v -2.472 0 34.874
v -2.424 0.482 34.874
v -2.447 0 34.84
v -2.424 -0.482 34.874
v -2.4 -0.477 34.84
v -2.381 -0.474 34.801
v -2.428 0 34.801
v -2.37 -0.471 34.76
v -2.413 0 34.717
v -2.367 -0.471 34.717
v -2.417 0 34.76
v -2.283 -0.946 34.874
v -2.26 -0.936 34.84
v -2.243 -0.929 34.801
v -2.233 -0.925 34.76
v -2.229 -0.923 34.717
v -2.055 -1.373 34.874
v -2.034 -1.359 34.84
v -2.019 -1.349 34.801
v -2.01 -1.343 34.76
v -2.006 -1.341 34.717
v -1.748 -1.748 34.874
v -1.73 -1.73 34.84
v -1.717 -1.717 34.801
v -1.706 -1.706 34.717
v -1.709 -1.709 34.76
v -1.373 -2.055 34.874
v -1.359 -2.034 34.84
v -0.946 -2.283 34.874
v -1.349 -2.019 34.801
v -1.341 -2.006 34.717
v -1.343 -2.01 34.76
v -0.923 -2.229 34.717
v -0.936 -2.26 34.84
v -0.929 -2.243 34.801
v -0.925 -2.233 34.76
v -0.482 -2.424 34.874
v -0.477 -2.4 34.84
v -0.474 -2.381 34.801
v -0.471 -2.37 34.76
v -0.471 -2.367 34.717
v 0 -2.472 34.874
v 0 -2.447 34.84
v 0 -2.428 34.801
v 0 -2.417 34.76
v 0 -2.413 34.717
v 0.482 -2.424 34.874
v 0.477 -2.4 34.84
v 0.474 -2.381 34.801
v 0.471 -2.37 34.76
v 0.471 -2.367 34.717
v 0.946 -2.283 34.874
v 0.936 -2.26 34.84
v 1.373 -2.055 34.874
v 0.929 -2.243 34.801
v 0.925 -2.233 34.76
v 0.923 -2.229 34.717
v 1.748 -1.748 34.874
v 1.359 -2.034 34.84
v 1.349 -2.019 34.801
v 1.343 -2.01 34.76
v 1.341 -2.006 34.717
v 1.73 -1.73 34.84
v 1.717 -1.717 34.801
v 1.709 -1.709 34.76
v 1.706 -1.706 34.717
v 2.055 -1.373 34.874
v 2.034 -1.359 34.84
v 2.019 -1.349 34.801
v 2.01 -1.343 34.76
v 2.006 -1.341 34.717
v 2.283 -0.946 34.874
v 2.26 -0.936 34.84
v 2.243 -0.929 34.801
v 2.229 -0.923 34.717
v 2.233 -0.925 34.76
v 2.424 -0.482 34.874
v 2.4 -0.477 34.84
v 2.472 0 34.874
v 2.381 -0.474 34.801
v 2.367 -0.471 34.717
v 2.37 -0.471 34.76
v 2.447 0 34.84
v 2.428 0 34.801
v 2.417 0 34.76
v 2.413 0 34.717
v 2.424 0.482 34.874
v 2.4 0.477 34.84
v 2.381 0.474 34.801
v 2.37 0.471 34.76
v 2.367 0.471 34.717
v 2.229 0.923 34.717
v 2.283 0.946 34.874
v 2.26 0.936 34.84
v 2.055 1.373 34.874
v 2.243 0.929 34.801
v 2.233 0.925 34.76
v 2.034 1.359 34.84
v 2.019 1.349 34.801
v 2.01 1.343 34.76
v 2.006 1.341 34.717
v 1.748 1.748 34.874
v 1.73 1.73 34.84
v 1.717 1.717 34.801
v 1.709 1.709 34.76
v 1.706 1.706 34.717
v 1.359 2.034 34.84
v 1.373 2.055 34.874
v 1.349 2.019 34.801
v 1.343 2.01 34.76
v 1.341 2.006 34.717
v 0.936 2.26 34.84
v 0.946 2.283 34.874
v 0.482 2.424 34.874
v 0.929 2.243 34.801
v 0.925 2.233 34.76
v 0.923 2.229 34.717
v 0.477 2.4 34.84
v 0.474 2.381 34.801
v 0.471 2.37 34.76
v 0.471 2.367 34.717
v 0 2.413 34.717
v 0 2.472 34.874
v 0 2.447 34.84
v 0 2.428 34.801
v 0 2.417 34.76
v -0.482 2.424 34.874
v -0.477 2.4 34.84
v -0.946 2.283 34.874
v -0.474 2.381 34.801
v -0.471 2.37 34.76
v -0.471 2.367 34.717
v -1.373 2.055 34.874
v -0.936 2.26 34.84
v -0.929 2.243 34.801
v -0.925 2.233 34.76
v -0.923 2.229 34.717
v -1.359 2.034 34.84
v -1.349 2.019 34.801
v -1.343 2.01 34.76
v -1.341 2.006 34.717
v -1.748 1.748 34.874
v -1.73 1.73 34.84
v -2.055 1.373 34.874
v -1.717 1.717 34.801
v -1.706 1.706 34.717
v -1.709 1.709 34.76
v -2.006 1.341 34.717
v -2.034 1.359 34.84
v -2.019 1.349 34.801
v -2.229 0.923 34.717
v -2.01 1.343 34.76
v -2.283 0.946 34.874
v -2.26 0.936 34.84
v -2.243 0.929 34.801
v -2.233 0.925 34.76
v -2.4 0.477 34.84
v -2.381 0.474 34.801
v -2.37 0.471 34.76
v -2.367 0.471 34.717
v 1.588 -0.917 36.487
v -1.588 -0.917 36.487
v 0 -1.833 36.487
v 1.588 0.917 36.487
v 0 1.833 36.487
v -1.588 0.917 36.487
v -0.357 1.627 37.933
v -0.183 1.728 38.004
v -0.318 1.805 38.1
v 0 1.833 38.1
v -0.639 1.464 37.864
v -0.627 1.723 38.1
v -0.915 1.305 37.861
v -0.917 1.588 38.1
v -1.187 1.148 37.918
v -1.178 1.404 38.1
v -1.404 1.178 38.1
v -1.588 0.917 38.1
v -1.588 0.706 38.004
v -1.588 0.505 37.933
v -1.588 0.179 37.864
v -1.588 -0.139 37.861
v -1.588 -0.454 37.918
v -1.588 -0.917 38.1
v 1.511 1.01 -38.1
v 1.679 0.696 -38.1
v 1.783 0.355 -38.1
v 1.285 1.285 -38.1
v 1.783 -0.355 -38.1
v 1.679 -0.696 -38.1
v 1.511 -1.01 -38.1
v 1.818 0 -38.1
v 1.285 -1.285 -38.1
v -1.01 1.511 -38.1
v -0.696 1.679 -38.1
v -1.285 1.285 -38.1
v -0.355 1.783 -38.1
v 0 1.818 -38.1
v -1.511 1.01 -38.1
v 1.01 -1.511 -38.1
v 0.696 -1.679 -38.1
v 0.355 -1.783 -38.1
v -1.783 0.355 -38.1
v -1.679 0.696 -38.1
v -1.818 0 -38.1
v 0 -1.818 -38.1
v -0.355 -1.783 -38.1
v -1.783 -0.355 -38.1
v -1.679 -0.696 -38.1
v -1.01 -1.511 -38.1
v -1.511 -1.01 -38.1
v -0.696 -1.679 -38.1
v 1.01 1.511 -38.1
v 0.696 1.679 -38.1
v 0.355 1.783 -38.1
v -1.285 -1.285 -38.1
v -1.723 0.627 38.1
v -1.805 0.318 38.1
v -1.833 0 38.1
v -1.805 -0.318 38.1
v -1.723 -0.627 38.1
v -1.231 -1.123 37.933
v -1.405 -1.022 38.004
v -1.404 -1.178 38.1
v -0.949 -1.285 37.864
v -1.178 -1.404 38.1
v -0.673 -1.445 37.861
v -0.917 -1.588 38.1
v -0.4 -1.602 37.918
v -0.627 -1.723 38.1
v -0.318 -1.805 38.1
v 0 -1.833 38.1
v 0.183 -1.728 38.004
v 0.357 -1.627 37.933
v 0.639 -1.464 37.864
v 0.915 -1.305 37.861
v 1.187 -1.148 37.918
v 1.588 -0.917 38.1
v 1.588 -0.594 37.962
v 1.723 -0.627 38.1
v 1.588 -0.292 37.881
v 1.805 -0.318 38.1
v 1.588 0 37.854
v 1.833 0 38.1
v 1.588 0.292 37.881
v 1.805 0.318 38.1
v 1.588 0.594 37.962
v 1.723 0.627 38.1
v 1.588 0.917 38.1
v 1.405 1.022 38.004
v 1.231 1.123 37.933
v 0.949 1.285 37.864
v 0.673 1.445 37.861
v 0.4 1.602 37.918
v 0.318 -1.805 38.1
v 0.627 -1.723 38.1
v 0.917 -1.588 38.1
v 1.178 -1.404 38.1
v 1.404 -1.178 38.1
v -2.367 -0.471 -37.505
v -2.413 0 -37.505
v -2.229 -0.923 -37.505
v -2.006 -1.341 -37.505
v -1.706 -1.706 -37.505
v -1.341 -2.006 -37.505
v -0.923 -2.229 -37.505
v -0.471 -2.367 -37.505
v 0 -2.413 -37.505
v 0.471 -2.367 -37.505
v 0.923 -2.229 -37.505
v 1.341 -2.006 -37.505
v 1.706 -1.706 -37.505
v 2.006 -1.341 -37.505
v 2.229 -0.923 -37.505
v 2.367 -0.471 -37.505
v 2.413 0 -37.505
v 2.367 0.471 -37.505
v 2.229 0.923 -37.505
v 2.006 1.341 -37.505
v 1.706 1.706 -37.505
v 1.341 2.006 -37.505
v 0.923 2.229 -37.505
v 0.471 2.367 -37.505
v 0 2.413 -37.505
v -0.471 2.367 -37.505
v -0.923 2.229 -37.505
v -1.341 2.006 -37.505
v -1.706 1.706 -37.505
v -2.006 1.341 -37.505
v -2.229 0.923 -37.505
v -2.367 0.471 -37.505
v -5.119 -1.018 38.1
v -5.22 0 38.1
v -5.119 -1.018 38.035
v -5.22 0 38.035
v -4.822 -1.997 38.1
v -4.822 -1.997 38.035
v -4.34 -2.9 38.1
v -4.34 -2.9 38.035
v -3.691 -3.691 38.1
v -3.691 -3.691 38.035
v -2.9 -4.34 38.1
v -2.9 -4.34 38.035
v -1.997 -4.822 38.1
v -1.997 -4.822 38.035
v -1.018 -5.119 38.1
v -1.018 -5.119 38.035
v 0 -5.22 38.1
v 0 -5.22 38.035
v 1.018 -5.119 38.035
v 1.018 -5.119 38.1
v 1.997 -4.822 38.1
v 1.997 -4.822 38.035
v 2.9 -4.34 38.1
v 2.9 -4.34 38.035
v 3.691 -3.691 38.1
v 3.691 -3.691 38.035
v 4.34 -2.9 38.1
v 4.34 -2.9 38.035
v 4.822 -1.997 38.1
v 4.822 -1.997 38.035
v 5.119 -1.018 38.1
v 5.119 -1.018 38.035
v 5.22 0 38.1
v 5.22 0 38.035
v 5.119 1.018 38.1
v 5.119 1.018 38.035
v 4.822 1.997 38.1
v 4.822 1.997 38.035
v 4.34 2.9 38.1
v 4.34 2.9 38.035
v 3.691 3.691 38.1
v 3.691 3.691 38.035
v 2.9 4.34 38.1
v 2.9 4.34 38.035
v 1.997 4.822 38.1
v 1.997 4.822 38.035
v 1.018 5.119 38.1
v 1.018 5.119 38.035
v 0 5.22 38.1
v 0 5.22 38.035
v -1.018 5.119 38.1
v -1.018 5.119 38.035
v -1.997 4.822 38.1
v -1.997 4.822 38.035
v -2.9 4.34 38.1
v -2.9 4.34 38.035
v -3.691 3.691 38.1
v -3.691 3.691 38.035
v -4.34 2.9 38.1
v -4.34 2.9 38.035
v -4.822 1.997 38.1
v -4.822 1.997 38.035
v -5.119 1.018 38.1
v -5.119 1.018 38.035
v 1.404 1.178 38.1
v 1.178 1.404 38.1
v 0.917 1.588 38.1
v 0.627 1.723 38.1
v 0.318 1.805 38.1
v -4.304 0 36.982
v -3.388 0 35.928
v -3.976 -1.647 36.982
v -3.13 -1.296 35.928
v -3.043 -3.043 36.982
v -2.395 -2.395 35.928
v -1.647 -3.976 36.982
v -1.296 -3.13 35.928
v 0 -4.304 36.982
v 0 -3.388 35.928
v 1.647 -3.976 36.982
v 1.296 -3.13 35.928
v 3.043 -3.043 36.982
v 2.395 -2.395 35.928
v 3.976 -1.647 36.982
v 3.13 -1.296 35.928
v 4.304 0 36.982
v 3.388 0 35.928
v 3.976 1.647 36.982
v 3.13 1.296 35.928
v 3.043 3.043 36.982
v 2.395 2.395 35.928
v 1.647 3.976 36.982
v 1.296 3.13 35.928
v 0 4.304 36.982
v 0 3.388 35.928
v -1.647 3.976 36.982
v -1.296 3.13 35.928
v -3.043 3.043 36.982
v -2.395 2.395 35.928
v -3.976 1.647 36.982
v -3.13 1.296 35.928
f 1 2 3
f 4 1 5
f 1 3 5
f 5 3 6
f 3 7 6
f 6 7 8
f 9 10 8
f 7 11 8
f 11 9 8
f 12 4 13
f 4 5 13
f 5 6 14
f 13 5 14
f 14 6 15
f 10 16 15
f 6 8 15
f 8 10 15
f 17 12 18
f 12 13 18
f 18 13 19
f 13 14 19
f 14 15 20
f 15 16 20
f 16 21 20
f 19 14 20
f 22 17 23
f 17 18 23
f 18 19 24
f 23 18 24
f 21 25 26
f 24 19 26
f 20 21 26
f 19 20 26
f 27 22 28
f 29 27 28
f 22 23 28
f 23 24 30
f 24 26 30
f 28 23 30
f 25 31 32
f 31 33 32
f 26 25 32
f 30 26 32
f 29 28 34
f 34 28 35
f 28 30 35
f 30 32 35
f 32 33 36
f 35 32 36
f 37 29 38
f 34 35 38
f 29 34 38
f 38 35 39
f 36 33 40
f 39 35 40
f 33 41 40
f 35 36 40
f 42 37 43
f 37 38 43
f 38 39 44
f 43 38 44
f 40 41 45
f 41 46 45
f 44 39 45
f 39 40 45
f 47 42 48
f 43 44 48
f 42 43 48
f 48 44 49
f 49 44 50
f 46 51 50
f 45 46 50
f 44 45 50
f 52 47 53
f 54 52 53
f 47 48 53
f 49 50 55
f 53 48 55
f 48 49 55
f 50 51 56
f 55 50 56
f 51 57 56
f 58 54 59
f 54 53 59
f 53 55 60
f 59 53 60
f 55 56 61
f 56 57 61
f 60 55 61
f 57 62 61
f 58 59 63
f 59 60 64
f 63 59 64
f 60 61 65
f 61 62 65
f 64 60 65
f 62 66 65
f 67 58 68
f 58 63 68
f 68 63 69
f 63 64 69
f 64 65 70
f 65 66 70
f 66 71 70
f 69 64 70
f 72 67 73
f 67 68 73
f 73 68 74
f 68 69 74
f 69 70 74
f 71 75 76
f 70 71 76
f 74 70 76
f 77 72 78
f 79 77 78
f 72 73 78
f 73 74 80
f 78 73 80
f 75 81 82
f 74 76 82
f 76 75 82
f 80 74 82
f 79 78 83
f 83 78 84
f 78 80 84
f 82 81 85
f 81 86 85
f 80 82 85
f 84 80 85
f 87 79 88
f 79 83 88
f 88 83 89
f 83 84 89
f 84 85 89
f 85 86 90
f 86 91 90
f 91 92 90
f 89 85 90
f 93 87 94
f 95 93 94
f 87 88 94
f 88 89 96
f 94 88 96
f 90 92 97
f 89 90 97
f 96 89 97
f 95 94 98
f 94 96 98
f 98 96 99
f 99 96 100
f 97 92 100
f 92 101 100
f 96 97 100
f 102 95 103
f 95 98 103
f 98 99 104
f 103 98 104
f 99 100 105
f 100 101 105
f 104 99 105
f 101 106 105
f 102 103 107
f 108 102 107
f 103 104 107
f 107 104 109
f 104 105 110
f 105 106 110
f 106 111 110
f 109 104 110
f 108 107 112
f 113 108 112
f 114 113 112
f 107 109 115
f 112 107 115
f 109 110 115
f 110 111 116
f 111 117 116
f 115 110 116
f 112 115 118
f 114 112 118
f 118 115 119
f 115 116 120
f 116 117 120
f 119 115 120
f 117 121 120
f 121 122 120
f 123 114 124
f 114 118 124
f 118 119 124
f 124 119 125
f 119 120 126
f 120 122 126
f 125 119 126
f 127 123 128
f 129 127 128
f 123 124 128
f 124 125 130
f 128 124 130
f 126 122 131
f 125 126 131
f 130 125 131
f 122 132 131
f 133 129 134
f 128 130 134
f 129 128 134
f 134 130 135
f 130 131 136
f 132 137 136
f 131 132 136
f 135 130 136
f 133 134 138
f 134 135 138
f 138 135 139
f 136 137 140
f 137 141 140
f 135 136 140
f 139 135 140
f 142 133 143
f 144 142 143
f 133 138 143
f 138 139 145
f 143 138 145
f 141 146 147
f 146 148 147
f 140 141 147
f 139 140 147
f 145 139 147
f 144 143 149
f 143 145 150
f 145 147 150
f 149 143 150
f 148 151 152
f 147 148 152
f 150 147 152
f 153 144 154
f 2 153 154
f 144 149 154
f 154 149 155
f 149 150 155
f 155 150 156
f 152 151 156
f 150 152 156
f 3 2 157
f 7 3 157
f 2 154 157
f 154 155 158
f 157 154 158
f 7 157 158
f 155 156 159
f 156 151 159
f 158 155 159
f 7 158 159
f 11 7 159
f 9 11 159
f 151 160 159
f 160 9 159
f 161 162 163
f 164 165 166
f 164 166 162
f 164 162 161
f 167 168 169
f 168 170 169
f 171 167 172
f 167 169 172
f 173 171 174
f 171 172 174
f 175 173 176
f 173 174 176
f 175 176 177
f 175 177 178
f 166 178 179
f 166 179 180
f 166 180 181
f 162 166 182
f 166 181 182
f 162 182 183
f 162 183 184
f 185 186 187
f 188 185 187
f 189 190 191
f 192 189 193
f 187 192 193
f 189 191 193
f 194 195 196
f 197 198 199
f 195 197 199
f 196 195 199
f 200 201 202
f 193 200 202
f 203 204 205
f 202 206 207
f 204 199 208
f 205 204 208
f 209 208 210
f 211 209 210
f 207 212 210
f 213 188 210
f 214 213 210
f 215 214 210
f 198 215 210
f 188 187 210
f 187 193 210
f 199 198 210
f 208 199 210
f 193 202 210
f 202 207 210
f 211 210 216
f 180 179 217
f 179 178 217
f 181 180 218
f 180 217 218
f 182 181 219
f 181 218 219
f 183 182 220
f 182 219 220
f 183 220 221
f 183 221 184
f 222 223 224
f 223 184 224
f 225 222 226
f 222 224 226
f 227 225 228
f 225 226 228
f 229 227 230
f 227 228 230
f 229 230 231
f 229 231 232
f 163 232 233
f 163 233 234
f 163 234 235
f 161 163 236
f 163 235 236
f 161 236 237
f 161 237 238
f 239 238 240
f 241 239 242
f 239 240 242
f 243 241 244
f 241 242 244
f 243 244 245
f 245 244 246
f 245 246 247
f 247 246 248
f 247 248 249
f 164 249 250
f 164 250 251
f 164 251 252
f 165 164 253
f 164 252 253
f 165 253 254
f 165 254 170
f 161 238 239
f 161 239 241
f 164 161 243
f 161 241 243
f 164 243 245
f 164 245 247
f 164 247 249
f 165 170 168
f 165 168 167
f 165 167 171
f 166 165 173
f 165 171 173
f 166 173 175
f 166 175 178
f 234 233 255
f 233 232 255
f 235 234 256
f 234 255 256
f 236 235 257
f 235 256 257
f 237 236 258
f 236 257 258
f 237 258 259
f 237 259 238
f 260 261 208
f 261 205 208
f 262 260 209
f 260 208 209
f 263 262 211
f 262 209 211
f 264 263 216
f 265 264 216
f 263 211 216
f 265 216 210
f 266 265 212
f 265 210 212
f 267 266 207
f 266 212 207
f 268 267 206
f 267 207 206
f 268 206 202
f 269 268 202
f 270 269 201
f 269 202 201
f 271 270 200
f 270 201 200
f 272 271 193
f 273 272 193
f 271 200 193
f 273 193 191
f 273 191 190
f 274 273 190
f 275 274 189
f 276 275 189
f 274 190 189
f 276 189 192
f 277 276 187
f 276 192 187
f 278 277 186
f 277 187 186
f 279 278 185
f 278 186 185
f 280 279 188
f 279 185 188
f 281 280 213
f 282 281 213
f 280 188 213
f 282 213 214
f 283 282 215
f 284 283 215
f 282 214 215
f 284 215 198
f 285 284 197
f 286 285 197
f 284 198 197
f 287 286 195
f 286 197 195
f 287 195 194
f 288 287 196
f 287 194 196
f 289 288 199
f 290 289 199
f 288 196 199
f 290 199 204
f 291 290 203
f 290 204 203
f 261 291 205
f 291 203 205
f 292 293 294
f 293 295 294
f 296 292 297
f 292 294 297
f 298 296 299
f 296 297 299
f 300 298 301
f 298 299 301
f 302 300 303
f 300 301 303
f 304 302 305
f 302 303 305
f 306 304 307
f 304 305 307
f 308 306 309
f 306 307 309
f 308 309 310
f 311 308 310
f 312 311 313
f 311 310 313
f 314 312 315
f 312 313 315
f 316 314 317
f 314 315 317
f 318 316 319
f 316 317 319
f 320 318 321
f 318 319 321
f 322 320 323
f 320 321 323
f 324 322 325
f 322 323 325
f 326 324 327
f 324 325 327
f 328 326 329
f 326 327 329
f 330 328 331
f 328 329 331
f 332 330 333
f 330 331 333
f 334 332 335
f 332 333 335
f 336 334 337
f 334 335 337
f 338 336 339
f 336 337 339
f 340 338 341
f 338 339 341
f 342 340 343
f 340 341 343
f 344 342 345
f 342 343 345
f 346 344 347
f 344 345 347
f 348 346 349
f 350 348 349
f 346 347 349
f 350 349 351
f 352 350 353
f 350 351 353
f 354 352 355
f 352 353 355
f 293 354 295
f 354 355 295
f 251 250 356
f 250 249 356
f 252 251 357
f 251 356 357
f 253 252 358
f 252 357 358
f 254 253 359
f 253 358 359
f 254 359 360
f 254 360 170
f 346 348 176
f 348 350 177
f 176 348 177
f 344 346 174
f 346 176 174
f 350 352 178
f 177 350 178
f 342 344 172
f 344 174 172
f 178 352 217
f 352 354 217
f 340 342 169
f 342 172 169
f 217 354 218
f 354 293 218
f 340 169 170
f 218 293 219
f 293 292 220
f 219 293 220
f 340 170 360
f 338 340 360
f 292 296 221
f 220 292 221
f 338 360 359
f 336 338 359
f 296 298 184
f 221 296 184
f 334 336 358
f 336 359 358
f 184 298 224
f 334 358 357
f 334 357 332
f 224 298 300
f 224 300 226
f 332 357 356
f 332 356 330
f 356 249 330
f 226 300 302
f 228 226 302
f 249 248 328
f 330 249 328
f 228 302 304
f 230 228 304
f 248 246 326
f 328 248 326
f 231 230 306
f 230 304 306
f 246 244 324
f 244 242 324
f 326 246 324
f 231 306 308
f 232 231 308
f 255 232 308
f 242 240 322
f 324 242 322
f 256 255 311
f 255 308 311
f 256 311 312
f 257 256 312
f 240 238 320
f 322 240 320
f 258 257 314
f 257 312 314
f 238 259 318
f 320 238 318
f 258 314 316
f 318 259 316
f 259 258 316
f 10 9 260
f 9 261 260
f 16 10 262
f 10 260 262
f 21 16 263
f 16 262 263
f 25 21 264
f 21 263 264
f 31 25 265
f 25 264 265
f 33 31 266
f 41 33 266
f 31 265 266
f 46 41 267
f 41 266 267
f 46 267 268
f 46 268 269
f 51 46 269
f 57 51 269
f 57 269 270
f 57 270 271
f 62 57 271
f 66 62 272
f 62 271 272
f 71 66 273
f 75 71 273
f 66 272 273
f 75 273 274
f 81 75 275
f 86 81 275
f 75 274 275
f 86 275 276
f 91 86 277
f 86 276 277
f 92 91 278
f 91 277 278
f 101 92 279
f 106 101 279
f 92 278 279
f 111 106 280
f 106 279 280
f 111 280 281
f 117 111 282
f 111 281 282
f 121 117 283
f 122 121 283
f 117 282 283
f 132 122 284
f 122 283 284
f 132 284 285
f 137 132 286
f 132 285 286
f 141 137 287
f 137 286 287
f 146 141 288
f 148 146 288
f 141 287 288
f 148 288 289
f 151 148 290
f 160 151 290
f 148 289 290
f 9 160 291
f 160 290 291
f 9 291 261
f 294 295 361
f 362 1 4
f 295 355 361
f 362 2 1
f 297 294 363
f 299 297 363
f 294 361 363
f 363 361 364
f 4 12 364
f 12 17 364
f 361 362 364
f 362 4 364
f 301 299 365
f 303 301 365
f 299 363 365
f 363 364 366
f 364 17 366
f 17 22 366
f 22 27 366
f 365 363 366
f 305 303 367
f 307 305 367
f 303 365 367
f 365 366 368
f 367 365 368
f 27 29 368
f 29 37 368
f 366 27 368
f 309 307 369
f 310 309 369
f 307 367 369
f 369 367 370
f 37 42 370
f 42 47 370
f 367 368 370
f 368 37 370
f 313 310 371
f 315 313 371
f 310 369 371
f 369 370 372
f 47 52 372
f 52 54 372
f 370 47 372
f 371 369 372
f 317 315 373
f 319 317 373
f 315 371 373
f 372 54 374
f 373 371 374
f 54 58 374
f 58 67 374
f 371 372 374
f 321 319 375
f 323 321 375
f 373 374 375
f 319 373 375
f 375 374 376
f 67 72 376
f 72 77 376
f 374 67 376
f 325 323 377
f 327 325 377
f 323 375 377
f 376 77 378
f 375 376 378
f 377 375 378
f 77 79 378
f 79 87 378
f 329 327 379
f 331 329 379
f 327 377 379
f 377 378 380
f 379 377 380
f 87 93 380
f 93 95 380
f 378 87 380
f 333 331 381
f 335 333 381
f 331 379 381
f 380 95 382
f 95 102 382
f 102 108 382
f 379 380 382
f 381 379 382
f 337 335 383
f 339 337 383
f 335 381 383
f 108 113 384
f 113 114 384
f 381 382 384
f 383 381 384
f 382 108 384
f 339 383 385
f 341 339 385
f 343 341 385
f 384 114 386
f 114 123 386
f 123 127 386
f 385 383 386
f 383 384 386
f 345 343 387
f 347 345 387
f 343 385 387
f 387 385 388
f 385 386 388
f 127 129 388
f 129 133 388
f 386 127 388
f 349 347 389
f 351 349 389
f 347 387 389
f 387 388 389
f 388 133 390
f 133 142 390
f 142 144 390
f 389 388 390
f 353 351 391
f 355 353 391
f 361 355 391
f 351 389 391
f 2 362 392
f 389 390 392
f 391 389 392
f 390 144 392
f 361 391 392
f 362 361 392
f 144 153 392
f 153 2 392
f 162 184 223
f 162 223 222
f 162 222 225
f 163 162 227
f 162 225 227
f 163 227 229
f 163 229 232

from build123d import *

# Parameters (mm, degrees)
SKETCH10_R         = 1.833087105
CUT_EXTRUDE2_DEPTH = 1.6129
CUT_EXTRUDE2_DRAFT = -45
CUT_EXTRUDE1_DEPTH = 1.6129


with BuildPart() as part:
    # Sketch2 → Revolve1 (revolve)
    with BuildSketch(Plane(origin=(0, 0, 0), x_dir=(0, 0, -1), z_dir=(1, 0, 0)), mode=Mode.PRIVATE) as revolve1_sk:
        with BuildLine():
            Line((-38.035484, 5.2197), (-34.8742, 2.471637744))
            ThreePointArc((-34.8742, 2.471637744), (-34.80108483, 2.428138789), (-34.717366229, 2.413))
            Line((-34.717366229, 2.413), (37.5046875, 2.413))
            Line((37.5046875, 2.413), (38.1, 1.8176875))
            Line((38.1, 1.8176875), (38.1, 0))
            Line((38.1, 0), (-38.1, 0))
            Line((-38.1, 0), (-38.1, 5.2197))
            Line((-38.1, 5.2197), (-38.035484, 5.2197))
        make_face()
    revolve(revolve1_sk.sketch.rotate(Axis((0, 0, -38.1), (0, 0, 1)), 90), axis=Axis((0, 0, -38.1), (0, 0, 1)))


with BuildPart() as cut_extrude2_tool:
    # Sketch10 → Cut-Extrude2 (with draft: the straight prism first)
    with BuildSketch(Plane.XY.offset(38.1)):
        Circle(SKETCH10_R)
    extrude(amount=-CUT_EXTRUDE2_DEPTH)
    # Cut-Extrude2: the draft: its side faces are tilted about the plane it starts from
    cut_extrude2_sides = [cut_extrude2_tool.faces().sort_by_distance(p)[0] for p in [
        (-1.833087105, 0, 37.29355),
    ]]
    draft(cut_extrude2_sides, Plane.XY.offset(38.1), CUT_EXTRUDE2_DRAFT)


with BuildPart() as part_1:
    add(part.part)

    # Cut-Extrude2: cut by cut_extrude2_tool
    add(cut_extrude2_tool.part, mode=Mode.SUBTRACT)

    # Sketch9 → Cut-Extrude1 (cut)
    with BuildSketch(Plane.XY.offset(38.1)):
        Polygon((1.5875, -0.916543552), (1.5875, 0.916543552), (0, 1.833087105), (-1.5875, 0.916543552), (-1.5875, -0.916543552), (0, -1.833087105), align=None)
    extrude(amount=-CUT_EXTRUDE1_DEPTH, mode=Mode.SUBTRACT)


solid = part_1.part
